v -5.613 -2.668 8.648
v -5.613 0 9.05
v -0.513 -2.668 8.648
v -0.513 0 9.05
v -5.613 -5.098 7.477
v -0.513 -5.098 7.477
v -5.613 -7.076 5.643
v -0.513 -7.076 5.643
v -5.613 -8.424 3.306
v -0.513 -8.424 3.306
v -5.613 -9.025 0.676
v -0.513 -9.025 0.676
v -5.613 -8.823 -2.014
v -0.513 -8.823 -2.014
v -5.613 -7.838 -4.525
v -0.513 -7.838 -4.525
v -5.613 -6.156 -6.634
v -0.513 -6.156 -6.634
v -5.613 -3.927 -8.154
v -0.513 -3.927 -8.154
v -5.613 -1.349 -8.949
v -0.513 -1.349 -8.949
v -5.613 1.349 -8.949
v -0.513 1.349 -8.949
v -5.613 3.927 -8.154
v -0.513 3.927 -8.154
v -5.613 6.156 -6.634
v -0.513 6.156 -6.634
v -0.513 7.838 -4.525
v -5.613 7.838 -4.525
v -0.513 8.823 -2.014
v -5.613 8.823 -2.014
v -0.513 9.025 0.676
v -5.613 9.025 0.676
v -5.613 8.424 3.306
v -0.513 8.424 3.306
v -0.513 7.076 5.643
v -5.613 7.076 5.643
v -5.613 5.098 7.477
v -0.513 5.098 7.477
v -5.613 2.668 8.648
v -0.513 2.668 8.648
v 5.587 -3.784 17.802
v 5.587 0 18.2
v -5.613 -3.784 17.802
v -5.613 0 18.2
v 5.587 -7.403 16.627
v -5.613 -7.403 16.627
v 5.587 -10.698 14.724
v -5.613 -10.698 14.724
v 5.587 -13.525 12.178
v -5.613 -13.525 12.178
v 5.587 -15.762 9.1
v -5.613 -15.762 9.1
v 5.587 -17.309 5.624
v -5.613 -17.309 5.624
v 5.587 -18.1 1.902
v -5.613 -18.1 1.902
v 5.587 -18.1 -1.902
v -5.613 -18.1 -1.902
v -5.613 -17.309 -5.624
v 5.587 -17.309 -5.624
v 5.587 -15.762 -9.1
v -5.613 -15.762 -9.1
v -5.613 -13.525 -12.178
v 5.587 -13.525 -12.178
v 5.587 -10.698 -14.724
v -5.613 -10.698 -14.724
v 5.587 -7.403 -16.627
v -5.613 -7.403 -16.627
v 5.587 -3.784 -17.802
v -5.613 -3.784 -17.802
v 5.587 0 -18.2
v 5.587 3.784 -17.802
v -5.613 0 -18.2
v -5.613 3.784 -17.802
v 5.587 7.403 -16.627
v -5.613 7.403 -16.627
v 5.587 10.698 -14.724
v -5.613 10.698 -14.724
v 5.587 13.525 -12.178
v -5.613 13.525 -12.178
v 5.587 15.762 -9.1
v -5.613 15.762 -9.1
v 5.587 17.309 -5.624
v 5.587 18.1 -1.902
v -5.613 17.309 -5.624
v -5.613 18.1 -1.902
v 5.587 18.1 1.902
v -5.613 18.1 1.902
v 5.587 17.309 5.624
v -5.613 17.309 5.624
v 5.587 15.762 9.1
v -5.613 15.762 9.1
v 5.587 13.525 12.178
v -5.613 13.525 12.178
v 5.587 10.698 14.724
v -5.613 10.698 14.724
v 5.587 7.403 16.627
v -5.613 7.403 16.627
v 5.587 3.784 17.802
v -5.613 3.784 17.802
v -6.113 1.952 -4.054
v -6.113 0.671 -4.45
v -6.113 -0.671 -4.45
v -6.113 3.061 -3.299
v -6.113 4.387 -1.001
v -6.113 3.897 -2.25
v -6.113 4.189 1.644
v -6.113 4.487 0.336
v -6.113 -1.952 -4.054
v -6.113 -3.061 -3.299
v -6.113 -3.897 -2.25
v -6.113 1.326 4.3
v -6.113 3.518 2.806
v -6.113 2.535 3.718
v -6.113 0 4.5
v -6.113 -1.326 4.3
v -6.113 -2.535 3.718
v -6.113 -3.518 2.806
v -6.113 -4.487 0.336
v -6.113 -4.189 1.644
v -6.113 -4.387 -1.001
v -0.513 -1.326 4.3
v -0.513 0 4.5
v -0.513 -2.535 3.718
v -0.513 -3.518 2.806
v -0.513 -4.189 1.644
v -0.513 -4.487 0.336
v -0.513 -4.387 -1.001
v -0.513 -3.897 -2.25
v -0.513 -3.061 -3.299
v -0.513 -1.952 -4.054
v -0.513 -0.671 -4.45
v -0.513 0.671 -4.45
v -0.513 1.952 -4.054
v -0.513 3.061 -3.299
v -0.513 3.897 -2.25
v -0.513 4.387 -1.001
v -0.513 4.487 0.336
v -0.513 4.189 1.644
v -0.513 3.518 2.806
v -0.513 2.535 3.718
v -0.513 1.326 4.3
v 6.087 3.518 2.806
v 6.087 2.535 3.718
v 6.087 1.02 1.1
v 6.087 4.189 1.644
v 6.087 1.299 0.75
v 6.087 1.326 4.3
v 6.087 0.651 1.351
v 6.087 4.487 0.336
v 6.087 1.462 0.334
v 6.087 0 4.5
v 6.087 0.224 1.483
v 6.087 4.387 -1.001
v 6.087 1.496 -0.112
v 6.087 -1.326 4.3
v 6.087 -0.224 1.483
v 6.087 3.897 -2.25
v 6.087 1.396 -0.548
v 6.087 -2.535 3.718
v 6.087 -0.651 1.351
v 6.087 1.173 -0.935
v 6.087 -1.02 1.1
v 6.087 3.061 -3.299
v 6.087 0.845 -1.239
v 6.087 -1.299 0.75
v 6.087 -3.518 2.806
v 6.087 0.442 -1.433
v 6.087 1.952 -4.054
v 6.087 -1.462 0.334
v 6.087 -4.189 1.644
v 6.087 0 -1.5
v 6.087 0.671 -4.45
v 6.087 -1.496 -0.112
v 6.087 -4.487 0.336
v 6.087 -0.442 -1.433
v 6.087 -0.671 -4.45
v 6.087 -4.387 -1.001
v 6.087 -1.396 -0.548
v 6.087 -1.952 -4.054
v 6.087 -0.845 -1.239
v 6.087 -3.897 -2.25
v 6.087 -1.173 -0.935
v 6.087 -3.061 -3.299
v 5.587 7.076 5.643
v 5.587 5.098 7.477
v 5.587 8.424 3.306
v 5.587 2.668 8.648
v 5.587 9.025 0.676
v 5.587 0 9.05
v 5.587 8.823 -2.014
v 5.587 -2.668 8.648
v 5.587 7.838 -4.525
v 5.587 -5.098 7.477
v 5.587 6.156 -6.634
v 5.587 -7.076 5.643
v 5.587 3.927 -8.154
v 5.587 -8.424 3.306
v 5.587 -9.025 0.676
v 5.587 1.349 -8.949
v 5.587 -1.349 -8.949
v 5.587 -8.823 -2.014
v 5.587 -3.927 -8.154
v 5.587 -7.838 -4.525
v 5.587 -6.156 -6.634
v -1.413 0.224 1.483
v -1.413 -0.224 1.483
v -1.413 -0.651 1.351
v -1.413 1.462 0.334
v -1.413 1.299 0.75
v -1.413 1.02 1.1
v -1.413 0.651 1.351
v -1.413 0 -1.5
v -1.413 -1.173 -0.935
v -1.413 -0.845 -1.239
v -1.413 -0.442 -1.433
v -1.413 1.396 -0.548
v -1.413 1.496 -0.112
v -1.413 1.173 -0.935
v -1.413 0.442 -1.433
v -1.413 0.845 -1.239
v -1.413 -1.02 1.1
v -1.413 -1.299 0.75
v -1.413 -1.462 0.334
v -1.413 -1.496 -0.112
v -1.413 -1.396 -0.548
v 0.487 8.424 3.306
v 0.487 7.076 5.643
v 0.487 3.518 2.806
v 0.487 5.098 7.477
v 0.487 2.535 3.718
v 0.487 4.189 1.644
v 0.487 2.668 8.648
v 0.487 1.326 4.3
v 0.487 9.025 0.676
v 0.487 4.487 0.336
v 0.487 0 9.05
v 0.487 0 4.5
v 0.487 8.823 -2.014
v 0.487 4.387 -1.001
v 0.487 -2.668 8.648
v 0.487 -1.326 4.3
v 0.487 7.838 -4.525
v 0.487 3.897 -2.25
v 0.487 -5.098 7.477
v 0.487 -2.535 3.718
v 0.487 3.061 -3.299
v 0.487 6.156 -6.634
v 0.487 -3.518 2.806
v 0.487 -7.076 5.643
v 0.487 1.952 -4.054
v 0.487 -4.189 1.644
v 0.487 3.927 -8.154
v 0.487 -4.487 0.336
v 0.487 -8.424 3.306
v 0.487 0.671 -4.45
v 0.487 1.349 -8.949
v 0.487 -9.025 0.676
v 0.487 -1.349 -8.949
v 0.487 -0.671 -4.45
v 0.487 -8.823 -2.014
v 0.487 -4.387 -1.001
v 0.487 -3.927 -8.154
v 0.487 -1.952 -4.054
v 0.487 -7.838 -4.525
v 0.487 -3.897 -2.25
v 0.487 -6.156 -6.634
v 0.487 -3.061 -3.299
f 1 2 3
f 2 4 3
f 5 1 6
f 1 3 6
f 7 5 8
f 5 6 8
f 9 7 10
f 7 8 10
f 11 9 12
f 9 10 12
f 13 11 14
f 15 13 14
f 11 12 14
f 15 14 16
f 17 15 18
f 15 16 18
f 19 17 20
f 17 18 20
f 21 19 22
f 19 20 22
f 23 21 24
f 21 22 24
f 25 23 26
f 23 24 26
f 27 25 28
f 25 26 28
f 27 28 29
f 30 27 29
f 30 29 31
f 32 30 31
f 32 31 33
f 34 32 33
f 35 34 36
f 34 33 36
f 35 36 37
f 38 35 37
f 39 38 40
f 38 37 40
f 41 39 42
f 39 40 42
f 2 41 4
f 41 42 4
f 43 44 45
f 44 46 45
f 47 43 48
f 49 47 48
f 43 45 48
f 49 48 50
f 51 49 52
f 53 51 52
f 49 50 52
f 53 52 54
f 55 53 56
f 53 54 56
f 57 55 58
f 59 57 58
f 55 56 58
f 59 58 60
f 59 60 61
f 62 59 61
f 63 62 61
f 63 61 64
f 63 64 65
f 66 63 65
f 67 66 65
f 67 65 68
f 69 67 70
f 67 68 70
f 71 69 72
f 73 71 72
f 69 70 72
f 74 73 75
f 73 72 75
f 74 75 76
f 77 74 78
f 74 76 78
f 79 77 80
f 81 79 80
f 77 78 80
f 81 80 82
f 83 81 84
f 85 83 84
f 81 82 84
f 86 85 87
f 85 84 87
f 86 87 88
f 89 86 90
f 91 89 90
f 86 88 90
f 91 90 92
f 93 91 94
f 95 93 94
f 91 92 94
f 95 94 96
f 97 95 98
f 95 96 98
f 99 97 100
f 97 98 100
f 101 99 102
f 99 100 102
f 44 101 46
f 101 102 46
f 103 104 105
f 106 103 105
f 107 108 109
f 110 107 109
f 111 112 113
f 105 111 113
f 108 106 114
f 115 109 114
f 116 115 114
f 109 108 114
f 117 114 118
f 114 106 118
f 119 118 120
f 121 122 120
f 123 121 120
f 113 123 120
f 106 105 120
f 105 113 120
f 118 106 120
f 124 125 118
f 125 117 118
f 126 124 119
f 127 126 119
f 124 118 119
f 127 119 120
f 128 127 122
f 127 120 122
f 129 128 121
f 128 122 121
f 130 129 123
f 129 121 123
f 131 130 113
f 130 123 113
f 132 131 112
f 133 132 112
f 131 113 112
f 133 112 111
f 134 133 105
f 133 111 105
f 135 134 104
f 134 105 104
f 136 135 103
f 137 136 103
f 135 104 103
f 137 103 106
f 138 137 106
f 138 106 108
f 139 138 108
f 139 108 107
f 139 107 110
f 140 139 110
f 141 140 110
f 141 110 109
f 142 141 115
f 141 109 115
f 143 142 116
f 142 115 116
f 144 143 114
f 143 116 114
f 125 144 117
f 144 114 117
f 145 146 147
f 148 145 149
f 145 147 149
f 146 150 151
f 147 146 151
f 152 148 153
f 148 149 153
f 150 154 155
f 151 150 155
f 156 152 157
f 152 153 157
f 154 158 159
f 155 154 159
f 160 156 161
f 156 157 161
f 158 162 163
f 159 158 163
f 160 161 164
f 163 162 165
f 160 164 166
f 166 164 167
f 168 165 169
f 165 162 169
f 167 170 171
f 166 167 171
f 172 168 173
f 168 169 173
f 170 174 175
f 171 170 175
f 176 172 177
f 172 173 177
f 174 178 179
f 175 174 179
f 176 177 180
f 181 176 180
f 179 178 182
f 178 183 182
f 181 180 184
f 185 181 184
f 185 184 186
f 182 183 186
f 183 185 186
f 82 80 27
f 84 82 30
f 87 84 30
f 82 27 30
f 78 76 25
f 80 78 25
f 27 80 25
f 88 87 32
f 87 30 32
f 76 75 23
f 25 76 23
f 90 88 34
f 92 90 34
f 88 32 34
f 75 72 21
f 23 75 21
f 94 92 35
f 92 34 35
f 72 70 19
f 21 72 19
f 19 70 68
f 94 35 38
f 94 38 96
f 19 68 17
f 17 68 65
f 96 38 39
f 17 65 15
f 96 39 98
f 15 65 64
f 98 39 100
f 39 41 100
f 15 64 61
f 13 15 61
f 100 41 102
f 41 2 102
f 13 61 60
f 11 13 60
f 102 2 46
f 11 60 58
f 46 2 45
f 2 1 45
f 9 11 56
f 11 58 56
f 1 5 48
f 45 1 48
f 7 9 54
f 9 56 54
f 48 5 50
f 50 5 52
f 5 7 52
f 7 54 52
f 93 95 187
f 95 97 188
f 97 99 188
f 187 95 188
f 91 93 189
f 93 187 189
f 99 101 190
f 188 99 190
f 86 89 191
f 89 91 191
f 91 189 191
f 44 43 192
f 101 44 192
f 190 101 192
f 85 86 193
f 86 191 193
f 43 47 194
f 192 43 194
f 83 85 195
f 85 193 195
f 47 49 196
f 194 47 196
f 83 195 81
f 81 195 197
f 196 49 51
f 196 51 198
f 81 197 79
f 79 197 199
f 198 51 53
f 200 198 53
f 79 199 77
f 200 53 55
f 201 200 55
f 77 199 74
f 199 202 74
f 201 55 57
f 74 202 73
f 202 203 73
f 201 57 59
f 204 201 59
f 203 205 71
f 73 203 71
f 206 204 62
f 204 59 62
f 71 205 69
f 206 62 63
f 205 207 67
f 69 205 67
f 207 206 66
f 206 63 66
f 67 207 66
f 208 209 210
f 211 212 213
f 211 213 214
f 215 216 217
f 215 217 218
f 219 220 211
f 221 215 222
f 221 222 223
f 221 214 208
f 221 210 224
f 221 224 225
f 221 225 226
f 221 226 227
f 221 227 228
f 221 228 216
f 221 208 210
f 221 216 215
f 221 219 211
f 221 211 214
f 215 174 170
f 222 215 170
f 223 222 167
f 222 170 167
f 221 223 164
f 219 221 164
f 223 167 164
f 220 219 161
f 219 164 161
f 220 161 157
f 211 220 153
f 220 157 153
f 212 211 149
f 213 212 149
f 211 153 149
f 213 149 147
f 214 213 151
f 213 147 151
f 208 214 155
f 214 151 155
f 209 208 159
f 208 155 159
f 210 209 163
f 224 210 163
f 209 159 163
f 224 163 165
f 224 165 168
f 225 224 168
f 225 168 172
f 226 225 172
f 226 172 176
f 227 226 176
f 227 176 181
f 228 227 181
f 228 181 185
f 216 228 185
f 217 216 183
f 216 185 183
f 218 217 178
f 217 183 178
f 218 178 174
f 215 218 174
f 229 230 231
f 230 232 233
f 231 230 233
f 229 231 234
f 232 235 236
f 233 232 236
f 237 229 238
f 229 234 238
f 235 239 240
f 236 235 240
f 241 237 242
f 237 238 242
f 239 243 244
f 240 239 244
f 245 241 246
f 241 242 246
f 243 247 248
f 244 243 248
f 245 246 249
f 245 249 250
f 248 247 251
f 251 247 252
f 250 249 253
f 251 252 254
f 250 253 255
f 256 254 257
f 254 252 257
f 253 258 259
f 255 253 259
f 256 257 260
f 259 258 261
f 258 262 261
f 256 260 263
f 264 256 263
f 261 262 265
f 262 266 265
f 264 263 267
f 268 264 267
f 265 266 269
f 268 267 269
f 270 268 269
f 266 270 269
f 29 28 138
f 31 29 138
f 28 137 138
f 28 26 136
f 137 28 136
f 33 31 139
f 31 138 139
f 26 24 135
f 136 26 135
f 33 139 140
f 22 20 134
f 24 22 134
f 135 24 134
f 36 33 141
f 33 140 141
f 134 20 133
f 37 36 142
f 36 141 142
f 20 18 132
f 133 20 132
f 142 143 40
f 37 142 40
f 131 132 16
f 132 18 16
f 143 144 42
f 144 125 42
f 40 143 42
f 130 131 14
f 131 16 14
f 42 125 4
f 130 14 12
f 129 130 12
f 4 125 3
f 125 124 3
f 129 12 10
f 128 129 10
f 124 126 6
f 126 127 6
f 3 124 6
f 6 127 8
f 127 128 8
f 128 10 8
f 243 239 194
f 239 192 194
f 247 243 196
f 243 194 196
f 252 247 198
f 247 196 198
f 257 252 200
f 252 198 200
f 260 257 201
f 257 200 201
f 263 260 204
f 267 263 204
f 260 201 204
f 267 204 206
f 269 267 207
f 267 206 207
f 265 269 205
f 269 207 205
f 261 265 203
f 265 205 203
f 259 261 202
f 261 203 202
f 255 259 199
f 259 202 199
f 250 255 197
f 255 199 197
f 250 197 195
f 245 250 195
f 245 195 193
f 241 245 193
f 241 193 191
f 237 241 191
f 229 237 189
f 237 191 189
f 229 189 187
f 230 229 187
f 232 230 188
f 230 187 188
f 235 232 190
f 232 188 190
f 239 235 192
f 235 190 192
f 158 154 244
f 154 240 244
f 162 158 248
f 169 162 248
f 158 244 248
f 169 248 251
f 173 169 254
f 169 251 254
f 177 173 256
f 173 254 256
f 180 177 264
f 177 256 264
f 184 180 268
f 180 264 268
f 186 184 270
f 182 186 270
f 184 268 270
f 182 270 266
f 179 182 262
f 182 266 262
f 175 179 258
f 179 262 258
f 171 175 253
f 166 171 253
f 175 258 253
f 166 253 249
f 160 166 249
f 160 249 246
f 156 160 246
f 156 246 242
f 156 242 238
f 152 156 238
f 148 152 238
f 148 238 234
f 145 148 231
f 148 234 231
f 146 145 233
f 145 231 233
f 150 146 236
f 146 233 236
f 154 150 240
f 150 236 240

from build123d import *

# Parameters (mm, degrees)
SKETCH2_R          = 3
CUT_EXTRUDE1_DEPTH = 15
ECHELLE1_SCALE     = 0.5


with BuildPart() as part:
    # Sketch1 → Revolve1 (revolve)
    with BuildSketch(Plane.XY, mode=Mode.PRIVATE) as revolve1_sk:
        Polygon((-11.2, 18.1), (-1, 18.1), (-1, 9), (-12.2, 9), (-12.2, 0), (12.2, 0), (12.2, 9), (1, 9), (1, 18.1), (11.2, 18.1), (11.2, 36.4), (-11.2, 36.4), align=None)
    revolve(revolve1_sk.sketch.rotate(Axis((0, 0, 0), (1, 0, 0)), 90), axis=Axis((0, 0, 0), (1, 0, 0)))

    # Sketch2 → Cut-Extrude1 (cut)
    with BuildSketch(Plane(origin=(12.2, 0, 0), x_dir=(0, 0, -1), z_dir=(1, 0, 0))):
        Circle(SKETCH2_R)
    extrude(amount=-CUT_EXTRUDE1_DEPTH, mode=Mode.SUBTRACT)


with BuildPart() as part_1:
    # Echelle1: scaled about (-0.025714015, 0, 0)
    add(part.part.scale(ECHELLE1_SCALE).moved(Location((-0.012857007, 0, 0))))


solid = part_1.part
